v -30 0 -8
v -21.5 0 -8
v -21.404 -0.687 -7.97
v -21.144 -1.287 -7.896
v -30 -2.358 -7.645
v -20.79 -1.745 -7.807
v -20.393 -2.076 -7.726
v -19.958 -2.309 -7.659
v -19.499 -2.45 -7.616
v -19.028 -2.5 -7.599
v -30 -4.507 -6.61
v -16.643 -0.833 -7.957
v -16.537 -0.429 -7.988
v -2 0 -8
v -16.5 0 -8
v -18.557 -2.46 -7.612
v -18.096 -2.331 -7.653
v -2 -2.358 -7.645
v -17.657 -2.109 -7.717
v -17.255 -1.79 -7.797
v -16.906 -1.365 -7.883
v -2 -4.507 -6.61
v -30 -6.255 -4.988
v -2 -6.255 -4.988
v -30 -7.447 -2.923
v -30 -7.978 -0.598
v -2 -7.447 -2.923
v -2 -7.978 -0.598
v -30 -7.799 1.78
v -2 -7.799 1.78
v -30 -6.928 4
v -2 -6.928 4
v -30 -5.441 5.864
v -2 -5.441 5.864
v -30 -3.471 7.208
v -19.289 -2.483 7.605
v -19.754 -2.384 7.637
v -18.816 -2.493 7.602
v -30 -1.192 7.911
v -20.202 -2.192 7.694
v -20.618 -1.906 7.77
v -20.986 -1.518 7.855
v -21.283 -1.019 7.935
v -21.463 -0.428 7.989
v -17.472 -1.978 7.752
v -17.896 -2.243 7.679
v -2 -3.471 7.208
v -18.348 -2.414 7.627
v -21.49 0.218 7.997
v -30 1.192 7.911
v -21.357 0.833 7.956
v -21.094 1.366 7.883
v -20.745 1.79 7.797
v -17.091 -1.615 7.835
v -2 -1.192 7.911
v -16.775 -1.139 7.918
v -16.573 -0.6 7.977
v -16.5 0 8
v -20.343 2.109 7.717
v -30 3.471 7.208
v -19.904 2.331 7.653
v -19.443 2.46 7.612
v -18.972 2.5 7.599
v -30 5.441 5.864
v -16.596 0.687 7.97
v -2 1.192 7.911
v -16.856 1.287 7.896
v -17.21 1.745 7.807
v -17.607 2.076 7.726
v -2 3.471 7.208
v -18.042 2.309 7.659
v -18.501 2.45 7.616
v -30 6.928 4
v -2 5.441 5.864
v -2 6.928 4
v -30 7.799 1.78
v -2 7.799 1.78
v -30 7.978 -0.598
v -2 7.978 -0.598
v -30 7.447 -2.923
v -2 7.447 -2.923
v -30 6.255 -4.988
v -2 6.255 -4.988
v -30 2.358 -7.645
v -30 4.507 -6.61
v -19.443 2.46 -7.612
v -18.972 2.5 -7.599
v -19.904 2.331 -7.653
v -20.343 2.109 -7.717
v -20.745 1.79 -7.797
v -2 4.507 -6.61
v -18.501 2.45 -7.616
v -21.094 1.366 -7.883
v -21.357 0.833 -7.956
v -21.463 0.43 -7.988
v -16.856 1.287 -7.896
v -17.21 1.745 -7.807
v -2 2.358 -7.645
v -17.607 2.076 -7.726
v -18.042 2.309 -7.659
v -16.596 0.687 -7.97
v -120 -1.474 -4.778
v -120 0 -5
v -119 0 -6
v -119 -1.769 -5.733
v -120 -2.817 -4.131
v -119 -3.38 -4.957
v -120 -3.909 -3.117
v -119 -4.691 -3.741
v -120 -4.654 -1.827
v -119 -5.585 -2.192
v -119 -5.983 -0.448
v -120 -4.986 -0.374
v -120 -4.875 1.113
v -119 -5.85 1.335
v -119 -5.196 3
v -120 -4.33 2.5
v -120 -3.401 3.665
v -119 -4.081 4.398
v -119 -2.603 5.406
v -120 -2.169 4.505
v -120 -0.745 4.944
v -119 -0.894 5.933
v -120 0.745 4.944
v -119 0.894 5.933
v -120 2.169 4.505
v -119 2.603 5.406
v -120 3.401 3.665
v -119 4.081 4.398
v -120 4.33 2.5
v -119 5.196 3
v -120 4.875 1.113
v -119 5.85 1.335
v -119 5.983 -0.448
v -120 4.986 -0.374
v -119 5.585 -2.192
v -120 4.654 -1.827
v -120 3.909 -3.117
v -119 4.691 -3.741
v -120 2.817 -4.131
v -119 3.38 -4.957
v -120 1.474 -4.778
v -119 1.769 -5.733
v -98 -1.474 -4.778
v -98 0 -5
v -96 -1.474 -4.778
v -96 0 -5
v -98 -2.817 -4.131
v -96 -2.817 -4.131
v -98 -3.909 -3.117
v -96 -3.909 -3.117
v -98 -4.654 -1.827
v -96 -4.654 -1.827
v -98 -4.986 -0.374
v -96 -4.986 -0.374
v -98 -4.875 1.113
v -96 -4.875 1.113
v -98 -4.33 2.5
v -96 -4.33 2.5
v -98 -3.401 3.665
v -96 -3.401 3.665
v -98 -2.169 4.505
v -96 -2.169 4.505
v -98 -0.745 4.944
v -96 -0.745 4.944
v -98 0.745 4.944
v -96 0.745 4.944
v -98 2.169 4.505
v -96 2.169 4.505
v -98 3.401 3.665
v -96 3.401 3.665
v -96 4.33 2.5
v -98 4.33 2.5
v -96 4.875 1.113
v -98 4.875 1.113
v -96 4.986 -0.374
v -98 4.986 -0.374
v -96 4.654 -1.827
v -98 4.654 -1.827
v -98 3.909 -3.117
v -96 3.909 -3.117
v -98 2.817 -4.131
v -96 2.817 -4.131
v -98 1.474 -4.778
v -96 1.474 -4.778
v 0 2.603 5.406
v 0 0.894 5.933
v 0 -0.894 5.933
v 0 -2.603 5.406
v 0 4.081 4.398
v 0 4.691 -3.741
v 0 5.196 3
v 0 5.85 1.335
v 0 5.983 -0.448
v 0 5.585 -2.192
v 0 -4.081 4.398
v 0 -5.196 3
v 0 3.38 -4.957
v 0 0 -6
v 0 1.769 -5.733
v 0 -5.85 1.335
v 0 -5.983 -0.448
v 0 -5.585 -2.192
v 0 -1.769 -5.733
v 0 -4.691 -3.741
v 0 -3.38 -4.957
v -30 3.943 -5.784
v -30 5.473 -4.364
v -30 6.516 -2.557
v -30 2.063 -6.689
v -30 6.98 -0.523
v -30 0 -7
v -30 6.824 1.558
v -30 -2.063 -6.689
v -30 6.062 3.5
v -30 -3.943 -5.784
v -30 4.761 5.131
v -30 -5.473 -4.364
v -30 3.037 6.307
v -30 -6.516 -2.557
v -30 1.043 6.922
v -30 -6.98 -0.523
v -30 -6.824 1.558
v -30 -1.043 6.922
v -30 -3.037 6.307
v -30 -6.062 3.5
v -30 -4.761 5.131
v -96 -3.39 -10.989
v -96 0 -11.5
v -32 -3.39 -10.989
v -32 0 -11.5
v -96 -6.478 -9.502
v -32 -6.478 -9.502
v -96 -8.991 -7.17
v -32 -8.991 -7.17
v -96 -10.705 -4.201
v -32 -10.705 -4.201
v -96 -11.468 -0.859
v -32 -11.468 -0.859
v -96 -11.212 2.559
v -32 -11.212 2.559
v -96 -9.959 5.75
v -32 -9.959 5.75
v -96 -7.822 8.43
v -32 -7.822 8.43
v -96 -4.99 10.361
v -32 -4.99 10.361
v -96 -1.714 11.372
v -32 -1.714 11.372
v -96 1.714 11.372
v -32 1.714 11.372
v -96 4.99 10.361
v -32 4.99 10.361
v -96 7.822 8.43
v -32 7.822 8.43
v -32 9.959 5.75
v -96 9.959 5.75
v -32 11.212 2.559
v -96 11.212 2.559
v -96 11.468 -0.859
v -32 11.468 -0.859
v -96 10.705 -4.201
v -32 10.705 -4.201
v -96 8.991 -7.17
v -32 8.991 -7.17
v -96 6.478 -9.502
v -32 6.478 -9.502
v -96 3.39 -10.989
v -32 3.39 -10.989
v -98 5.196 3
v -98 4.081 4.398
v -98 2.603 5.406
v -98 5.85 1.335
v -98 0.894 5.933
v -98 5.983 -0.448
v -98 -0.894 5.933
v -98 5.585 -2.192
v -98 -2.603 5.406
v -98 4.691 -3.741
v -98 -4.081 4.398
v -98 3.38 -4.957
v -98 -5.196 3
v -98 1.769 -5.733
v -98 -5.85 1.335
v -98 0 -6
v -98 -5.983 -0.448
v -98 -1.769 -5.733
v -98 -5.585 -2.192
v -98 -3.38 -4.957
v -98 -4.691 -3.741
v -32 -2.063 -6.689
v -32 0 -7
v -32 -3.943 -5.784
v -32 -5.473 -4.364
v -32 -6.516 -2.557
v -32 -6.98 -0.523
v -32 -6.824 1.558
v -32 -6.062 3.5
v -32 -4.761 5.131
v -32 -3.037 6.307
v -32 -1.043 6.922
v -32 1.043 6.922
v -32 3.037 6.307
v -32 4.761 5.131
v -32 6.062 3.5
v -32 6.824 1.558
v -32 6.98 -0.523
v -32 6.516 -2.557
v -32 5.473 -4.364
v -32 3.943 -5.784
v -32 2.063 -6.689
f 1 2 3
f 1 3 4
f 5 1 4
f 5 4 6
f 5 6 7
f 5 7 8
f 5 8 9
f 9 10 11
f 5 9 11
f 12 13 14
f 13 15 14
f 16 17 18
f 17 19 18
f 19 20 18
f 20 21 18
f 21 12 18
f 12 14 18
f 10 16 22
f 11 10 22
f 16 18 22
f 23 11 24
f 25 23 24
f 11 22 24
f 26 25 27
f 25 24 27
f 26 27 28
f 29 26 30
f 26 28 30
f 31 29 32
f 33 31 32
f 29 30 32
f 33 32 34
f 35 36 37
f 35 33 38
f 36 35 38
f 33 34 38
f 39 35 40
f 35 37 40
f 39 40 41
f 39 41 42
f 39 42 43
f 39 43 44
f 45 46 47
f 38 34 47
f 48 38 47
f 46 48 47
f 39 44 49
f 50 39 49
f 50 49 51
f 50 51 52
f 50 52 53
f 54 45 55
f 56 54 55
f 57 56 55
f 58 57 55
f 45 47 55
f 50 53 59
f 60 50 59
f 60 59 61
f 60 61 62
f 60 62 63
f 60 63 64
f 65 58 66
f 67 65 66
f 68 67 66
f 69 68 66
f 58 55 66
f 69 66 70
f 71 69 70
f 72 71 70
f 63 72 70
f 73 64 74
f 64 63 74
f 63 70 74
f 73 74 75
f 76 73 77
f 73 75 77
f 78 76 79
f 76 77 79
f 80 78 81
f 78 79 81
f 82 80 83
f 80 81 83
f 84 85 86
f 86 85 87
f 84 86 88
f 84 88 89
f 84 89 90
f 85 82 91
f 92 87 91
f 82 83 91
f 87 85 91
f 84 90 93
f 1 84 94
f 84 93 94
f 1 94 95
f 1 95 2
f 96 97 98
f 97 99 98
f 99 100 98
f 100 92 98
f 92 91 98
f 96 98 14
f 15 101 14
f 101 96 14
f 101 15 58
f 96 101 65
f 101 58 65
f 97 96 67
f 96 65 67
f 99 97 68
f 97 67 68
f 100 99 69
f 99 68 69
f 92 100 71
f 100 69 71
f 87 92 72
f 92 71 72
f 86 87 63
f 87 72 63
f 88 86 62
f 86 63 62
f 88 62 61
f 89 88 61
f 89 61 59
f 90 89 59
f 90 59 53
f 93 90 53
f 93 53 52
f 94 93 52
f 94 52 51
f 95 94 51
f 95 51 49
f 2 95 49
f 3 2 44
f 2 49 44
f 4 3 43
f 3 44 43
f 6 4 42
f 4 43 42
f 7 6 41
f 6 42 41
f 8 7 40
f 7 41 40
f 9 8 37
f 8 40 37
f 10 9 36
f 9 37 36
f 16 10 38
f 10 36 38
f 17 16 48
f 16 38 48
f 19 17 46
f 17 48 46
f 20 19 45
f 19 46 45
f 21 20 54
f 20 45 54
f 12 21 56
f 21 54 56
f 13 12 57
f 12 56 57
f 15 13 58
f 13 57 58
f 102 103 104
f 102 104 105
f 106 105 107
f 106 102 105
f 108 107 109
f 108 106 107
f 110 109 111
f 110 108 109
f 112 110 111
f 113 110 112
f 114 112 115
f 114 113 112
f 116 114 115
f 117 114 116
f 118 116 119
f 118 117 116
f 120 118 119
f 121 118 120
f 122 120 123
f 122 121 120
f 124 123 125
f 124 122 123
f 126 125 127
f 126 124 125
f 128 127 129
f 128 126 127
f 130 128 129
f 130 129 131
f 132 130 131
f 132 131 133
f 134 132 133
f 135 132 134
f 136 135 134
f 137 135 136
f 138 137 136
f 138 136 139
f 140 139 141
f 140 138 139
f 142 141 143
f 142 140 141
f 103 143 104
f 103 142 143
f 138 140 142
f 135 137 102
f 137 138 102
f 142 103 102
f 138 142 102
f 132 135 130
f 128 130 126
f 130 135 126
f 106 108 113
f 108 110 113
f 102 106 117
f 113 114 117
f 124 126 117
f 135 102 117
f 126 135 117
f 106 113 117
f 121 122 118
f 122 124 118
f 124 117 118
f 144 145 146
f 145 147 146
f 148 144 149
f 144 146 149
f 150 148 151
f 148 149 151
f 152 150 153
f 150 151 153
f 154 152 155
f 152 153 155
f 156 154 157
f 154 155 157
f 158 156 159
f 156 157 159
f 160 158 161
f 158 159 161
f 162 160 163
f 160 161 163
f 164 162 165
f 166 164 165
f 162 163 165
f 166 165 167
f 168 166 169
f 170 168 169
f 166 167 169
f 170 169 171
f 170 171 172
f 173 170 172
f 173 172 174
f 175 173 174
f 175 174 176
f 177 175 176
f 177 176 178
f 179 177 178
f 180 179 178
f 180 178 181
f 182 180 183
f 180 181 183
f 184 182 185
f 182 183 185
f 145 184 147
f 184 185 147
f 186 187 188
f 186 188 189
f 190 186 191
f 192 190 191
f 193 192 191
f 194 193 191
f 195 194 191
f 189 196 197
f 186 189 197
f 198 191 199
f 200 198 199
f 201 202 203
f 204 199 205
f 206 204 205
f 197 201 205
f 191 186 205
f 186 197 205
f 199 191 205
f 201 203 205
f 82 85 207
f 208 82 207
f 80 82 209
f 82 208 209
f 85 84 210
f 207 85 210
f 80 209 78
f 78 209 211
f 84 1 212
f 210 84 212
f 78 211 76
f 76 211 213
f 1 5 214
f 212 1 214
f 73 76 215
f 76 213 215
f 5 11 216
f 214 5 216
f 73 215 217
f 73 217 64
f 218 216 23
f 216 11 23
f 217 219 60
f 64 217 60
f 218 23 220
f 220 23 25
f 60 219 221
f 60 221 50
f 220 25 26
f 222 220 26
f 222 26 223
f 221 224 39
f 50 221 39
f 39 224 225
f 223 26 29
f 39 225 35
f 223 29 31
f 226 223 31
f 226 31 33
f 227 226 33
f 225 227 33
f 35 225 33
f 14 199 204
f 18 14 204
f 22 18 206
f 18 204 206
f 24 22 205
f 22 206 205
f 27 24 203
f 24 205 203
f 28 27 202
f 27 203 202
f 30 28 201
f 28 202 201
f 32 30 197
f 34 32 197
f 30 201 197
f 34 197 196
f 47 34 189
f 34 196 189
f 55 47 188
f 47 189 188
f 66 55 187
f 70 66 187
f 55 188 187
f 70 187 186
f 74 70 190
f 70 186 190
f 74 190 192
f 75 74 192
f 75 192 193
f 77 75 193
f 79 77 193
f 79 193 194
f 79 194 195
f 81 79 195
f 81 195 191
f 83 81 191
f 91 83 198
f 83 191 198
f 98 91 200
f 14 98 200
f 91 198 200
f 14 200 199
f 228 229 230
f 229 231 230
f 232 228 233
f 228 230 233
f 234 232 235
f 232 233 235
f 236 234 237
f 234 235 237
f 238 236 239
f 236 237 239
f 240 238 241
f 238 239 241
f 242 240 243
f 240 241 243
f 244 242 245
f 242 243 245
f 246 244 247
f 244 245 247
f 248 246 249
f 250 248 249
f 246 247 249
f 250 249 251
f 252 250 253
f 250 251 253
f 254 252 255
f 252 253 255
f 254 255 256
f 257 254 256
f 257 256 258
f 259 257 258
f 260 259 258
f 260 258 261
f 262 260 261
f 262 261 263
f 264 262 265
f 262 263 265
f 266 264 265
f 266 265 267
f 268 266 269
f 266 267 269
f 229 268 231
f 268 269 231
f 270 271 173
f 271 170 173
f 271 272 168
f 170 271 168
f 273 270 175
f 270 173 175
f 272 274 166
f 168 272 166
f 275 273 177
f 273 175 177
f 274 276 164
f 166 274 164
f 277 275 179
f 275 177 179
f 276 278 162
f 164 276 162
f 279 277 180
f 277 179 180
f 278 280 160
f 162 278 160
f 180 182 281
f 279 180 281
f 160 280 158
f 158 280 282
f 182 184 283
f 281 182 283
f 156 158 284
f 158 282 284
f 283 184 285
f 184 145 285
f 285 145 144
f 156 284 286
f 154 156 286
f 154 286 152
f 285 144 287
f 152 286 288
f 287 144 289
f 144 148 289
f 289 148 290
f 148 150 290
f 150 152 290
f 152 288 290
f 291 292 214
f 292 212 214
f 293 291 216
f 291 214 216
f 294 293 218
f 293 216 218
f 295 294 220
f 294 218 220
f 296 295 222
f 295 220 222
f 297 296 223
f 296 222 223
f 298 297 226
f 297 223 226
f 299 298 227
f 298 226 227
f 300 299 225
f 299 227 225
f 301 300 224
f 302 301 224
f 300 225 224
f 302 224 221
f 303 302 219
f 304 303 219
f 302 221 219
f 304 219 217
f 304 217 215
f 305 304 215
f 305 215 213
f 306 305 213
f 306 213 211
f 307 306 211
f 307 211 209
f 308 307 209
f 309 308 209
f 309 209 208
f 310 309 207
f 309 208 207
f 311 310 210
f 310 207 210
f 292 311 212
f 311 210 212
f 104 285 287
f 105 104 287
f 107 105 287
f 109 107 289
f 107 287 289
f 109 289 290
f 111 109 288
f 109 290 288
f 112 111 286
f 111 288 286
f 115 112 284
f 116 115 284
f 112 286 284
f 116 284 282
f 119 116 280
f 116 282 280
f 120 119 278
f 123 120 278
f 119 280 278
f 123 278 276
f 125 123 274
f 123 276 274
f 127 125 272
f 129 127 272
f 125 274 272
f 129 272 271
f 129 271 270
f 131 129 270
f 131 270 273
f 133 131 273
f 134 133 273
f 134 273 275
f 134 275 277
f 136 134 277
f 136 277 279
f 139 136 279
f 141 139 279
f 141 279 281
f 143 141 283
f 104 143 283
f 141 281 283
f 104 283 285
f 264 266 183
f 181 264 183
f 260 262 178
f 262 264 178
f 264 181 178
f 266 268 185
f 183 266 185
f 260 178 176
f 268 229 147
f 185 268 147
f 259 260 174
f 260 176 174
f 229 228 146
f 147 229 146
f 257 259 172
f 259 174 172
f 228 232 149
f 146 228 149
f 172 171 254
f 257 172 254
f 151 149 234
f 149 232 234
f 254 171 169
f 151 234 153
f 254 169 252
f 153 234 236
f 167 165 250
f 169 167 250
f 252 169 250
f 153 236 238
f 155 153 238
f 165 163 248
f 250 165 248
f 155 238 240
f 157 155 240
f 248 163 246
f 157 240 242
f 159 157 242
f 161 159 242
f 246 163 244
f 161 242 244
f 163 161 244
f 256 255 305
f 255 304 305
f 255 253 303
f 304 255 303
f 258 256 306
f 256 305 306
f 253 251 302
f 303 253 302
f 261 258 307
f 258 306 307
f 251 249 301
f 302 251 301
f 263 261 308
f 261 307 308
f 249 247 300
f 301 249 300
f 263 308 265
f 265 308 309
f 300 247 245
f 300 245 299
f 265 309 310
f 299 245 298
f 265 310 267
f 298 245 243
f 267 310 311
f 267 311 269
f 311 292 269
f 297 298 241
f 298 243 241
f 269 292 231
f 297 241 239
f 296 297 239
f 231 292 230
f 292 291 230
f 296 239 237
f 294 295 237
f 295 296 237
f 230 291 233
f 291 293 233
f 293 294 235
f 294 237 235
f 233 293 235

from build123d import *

# Parameters (mm, degrees)
SKETCH3_R          = 2.5
CUT_EXTRUDE1_DEPTH = 10
CHAMFER1_SIZE      = 2
CHAMFER2_SIZE      = 1


with BuildPart() as part:
    # Sketch2 → Revolve1 (revolve)
    with BuildSketch(Plane.XY, mode=Mode.PRIVATE) as revolve1_sk:
        Polygon((0, 0), (-30, 0), (-32, 0), (-96, 0), (-98, 0), (-120, 0), (-120, 6), (-98, 6), (-98, 5), (-96, 5), (-96, 11.5), (-32, 11.5), (-32, 7), (-30, 7), (-30, 8), (0, 8), align=None)
    revolve(revolve1_sk.sketch.rotate(Axis((0, 0, 0), (-1, 0, 0)), 90), axis=Axis((0, 0, 0), (-1, 0, 0)))

    # Sketch3 → Cut-Extrude1 (cut, symmetric)
    with BuildSketch(Plane.XY):
        with Locations((-19, 0)):
            Circle(SKETCH3_R)
    extrude(amount=CUT_EXTRUDE1_DEPTH, both=True, mode=Mode.SUBTRACT)

    # Chamfer1
    chamfer1_edges = [part.edges().sort_by_distance(p)[0] for p in [
        (0, 0, 8),
    ]]
    chamfer(chamfer1_edges, length=CHAMFER1_SIZE)

    # Chamfer2
    chamfer2_edges = [part.edges().sort_by_distance(p)[0] for p in [
        (-120, 0, 6),
    ]]
    chamfer(chamfer2_edges, length=CHAMFER2_SIZE)


solid = part.part
